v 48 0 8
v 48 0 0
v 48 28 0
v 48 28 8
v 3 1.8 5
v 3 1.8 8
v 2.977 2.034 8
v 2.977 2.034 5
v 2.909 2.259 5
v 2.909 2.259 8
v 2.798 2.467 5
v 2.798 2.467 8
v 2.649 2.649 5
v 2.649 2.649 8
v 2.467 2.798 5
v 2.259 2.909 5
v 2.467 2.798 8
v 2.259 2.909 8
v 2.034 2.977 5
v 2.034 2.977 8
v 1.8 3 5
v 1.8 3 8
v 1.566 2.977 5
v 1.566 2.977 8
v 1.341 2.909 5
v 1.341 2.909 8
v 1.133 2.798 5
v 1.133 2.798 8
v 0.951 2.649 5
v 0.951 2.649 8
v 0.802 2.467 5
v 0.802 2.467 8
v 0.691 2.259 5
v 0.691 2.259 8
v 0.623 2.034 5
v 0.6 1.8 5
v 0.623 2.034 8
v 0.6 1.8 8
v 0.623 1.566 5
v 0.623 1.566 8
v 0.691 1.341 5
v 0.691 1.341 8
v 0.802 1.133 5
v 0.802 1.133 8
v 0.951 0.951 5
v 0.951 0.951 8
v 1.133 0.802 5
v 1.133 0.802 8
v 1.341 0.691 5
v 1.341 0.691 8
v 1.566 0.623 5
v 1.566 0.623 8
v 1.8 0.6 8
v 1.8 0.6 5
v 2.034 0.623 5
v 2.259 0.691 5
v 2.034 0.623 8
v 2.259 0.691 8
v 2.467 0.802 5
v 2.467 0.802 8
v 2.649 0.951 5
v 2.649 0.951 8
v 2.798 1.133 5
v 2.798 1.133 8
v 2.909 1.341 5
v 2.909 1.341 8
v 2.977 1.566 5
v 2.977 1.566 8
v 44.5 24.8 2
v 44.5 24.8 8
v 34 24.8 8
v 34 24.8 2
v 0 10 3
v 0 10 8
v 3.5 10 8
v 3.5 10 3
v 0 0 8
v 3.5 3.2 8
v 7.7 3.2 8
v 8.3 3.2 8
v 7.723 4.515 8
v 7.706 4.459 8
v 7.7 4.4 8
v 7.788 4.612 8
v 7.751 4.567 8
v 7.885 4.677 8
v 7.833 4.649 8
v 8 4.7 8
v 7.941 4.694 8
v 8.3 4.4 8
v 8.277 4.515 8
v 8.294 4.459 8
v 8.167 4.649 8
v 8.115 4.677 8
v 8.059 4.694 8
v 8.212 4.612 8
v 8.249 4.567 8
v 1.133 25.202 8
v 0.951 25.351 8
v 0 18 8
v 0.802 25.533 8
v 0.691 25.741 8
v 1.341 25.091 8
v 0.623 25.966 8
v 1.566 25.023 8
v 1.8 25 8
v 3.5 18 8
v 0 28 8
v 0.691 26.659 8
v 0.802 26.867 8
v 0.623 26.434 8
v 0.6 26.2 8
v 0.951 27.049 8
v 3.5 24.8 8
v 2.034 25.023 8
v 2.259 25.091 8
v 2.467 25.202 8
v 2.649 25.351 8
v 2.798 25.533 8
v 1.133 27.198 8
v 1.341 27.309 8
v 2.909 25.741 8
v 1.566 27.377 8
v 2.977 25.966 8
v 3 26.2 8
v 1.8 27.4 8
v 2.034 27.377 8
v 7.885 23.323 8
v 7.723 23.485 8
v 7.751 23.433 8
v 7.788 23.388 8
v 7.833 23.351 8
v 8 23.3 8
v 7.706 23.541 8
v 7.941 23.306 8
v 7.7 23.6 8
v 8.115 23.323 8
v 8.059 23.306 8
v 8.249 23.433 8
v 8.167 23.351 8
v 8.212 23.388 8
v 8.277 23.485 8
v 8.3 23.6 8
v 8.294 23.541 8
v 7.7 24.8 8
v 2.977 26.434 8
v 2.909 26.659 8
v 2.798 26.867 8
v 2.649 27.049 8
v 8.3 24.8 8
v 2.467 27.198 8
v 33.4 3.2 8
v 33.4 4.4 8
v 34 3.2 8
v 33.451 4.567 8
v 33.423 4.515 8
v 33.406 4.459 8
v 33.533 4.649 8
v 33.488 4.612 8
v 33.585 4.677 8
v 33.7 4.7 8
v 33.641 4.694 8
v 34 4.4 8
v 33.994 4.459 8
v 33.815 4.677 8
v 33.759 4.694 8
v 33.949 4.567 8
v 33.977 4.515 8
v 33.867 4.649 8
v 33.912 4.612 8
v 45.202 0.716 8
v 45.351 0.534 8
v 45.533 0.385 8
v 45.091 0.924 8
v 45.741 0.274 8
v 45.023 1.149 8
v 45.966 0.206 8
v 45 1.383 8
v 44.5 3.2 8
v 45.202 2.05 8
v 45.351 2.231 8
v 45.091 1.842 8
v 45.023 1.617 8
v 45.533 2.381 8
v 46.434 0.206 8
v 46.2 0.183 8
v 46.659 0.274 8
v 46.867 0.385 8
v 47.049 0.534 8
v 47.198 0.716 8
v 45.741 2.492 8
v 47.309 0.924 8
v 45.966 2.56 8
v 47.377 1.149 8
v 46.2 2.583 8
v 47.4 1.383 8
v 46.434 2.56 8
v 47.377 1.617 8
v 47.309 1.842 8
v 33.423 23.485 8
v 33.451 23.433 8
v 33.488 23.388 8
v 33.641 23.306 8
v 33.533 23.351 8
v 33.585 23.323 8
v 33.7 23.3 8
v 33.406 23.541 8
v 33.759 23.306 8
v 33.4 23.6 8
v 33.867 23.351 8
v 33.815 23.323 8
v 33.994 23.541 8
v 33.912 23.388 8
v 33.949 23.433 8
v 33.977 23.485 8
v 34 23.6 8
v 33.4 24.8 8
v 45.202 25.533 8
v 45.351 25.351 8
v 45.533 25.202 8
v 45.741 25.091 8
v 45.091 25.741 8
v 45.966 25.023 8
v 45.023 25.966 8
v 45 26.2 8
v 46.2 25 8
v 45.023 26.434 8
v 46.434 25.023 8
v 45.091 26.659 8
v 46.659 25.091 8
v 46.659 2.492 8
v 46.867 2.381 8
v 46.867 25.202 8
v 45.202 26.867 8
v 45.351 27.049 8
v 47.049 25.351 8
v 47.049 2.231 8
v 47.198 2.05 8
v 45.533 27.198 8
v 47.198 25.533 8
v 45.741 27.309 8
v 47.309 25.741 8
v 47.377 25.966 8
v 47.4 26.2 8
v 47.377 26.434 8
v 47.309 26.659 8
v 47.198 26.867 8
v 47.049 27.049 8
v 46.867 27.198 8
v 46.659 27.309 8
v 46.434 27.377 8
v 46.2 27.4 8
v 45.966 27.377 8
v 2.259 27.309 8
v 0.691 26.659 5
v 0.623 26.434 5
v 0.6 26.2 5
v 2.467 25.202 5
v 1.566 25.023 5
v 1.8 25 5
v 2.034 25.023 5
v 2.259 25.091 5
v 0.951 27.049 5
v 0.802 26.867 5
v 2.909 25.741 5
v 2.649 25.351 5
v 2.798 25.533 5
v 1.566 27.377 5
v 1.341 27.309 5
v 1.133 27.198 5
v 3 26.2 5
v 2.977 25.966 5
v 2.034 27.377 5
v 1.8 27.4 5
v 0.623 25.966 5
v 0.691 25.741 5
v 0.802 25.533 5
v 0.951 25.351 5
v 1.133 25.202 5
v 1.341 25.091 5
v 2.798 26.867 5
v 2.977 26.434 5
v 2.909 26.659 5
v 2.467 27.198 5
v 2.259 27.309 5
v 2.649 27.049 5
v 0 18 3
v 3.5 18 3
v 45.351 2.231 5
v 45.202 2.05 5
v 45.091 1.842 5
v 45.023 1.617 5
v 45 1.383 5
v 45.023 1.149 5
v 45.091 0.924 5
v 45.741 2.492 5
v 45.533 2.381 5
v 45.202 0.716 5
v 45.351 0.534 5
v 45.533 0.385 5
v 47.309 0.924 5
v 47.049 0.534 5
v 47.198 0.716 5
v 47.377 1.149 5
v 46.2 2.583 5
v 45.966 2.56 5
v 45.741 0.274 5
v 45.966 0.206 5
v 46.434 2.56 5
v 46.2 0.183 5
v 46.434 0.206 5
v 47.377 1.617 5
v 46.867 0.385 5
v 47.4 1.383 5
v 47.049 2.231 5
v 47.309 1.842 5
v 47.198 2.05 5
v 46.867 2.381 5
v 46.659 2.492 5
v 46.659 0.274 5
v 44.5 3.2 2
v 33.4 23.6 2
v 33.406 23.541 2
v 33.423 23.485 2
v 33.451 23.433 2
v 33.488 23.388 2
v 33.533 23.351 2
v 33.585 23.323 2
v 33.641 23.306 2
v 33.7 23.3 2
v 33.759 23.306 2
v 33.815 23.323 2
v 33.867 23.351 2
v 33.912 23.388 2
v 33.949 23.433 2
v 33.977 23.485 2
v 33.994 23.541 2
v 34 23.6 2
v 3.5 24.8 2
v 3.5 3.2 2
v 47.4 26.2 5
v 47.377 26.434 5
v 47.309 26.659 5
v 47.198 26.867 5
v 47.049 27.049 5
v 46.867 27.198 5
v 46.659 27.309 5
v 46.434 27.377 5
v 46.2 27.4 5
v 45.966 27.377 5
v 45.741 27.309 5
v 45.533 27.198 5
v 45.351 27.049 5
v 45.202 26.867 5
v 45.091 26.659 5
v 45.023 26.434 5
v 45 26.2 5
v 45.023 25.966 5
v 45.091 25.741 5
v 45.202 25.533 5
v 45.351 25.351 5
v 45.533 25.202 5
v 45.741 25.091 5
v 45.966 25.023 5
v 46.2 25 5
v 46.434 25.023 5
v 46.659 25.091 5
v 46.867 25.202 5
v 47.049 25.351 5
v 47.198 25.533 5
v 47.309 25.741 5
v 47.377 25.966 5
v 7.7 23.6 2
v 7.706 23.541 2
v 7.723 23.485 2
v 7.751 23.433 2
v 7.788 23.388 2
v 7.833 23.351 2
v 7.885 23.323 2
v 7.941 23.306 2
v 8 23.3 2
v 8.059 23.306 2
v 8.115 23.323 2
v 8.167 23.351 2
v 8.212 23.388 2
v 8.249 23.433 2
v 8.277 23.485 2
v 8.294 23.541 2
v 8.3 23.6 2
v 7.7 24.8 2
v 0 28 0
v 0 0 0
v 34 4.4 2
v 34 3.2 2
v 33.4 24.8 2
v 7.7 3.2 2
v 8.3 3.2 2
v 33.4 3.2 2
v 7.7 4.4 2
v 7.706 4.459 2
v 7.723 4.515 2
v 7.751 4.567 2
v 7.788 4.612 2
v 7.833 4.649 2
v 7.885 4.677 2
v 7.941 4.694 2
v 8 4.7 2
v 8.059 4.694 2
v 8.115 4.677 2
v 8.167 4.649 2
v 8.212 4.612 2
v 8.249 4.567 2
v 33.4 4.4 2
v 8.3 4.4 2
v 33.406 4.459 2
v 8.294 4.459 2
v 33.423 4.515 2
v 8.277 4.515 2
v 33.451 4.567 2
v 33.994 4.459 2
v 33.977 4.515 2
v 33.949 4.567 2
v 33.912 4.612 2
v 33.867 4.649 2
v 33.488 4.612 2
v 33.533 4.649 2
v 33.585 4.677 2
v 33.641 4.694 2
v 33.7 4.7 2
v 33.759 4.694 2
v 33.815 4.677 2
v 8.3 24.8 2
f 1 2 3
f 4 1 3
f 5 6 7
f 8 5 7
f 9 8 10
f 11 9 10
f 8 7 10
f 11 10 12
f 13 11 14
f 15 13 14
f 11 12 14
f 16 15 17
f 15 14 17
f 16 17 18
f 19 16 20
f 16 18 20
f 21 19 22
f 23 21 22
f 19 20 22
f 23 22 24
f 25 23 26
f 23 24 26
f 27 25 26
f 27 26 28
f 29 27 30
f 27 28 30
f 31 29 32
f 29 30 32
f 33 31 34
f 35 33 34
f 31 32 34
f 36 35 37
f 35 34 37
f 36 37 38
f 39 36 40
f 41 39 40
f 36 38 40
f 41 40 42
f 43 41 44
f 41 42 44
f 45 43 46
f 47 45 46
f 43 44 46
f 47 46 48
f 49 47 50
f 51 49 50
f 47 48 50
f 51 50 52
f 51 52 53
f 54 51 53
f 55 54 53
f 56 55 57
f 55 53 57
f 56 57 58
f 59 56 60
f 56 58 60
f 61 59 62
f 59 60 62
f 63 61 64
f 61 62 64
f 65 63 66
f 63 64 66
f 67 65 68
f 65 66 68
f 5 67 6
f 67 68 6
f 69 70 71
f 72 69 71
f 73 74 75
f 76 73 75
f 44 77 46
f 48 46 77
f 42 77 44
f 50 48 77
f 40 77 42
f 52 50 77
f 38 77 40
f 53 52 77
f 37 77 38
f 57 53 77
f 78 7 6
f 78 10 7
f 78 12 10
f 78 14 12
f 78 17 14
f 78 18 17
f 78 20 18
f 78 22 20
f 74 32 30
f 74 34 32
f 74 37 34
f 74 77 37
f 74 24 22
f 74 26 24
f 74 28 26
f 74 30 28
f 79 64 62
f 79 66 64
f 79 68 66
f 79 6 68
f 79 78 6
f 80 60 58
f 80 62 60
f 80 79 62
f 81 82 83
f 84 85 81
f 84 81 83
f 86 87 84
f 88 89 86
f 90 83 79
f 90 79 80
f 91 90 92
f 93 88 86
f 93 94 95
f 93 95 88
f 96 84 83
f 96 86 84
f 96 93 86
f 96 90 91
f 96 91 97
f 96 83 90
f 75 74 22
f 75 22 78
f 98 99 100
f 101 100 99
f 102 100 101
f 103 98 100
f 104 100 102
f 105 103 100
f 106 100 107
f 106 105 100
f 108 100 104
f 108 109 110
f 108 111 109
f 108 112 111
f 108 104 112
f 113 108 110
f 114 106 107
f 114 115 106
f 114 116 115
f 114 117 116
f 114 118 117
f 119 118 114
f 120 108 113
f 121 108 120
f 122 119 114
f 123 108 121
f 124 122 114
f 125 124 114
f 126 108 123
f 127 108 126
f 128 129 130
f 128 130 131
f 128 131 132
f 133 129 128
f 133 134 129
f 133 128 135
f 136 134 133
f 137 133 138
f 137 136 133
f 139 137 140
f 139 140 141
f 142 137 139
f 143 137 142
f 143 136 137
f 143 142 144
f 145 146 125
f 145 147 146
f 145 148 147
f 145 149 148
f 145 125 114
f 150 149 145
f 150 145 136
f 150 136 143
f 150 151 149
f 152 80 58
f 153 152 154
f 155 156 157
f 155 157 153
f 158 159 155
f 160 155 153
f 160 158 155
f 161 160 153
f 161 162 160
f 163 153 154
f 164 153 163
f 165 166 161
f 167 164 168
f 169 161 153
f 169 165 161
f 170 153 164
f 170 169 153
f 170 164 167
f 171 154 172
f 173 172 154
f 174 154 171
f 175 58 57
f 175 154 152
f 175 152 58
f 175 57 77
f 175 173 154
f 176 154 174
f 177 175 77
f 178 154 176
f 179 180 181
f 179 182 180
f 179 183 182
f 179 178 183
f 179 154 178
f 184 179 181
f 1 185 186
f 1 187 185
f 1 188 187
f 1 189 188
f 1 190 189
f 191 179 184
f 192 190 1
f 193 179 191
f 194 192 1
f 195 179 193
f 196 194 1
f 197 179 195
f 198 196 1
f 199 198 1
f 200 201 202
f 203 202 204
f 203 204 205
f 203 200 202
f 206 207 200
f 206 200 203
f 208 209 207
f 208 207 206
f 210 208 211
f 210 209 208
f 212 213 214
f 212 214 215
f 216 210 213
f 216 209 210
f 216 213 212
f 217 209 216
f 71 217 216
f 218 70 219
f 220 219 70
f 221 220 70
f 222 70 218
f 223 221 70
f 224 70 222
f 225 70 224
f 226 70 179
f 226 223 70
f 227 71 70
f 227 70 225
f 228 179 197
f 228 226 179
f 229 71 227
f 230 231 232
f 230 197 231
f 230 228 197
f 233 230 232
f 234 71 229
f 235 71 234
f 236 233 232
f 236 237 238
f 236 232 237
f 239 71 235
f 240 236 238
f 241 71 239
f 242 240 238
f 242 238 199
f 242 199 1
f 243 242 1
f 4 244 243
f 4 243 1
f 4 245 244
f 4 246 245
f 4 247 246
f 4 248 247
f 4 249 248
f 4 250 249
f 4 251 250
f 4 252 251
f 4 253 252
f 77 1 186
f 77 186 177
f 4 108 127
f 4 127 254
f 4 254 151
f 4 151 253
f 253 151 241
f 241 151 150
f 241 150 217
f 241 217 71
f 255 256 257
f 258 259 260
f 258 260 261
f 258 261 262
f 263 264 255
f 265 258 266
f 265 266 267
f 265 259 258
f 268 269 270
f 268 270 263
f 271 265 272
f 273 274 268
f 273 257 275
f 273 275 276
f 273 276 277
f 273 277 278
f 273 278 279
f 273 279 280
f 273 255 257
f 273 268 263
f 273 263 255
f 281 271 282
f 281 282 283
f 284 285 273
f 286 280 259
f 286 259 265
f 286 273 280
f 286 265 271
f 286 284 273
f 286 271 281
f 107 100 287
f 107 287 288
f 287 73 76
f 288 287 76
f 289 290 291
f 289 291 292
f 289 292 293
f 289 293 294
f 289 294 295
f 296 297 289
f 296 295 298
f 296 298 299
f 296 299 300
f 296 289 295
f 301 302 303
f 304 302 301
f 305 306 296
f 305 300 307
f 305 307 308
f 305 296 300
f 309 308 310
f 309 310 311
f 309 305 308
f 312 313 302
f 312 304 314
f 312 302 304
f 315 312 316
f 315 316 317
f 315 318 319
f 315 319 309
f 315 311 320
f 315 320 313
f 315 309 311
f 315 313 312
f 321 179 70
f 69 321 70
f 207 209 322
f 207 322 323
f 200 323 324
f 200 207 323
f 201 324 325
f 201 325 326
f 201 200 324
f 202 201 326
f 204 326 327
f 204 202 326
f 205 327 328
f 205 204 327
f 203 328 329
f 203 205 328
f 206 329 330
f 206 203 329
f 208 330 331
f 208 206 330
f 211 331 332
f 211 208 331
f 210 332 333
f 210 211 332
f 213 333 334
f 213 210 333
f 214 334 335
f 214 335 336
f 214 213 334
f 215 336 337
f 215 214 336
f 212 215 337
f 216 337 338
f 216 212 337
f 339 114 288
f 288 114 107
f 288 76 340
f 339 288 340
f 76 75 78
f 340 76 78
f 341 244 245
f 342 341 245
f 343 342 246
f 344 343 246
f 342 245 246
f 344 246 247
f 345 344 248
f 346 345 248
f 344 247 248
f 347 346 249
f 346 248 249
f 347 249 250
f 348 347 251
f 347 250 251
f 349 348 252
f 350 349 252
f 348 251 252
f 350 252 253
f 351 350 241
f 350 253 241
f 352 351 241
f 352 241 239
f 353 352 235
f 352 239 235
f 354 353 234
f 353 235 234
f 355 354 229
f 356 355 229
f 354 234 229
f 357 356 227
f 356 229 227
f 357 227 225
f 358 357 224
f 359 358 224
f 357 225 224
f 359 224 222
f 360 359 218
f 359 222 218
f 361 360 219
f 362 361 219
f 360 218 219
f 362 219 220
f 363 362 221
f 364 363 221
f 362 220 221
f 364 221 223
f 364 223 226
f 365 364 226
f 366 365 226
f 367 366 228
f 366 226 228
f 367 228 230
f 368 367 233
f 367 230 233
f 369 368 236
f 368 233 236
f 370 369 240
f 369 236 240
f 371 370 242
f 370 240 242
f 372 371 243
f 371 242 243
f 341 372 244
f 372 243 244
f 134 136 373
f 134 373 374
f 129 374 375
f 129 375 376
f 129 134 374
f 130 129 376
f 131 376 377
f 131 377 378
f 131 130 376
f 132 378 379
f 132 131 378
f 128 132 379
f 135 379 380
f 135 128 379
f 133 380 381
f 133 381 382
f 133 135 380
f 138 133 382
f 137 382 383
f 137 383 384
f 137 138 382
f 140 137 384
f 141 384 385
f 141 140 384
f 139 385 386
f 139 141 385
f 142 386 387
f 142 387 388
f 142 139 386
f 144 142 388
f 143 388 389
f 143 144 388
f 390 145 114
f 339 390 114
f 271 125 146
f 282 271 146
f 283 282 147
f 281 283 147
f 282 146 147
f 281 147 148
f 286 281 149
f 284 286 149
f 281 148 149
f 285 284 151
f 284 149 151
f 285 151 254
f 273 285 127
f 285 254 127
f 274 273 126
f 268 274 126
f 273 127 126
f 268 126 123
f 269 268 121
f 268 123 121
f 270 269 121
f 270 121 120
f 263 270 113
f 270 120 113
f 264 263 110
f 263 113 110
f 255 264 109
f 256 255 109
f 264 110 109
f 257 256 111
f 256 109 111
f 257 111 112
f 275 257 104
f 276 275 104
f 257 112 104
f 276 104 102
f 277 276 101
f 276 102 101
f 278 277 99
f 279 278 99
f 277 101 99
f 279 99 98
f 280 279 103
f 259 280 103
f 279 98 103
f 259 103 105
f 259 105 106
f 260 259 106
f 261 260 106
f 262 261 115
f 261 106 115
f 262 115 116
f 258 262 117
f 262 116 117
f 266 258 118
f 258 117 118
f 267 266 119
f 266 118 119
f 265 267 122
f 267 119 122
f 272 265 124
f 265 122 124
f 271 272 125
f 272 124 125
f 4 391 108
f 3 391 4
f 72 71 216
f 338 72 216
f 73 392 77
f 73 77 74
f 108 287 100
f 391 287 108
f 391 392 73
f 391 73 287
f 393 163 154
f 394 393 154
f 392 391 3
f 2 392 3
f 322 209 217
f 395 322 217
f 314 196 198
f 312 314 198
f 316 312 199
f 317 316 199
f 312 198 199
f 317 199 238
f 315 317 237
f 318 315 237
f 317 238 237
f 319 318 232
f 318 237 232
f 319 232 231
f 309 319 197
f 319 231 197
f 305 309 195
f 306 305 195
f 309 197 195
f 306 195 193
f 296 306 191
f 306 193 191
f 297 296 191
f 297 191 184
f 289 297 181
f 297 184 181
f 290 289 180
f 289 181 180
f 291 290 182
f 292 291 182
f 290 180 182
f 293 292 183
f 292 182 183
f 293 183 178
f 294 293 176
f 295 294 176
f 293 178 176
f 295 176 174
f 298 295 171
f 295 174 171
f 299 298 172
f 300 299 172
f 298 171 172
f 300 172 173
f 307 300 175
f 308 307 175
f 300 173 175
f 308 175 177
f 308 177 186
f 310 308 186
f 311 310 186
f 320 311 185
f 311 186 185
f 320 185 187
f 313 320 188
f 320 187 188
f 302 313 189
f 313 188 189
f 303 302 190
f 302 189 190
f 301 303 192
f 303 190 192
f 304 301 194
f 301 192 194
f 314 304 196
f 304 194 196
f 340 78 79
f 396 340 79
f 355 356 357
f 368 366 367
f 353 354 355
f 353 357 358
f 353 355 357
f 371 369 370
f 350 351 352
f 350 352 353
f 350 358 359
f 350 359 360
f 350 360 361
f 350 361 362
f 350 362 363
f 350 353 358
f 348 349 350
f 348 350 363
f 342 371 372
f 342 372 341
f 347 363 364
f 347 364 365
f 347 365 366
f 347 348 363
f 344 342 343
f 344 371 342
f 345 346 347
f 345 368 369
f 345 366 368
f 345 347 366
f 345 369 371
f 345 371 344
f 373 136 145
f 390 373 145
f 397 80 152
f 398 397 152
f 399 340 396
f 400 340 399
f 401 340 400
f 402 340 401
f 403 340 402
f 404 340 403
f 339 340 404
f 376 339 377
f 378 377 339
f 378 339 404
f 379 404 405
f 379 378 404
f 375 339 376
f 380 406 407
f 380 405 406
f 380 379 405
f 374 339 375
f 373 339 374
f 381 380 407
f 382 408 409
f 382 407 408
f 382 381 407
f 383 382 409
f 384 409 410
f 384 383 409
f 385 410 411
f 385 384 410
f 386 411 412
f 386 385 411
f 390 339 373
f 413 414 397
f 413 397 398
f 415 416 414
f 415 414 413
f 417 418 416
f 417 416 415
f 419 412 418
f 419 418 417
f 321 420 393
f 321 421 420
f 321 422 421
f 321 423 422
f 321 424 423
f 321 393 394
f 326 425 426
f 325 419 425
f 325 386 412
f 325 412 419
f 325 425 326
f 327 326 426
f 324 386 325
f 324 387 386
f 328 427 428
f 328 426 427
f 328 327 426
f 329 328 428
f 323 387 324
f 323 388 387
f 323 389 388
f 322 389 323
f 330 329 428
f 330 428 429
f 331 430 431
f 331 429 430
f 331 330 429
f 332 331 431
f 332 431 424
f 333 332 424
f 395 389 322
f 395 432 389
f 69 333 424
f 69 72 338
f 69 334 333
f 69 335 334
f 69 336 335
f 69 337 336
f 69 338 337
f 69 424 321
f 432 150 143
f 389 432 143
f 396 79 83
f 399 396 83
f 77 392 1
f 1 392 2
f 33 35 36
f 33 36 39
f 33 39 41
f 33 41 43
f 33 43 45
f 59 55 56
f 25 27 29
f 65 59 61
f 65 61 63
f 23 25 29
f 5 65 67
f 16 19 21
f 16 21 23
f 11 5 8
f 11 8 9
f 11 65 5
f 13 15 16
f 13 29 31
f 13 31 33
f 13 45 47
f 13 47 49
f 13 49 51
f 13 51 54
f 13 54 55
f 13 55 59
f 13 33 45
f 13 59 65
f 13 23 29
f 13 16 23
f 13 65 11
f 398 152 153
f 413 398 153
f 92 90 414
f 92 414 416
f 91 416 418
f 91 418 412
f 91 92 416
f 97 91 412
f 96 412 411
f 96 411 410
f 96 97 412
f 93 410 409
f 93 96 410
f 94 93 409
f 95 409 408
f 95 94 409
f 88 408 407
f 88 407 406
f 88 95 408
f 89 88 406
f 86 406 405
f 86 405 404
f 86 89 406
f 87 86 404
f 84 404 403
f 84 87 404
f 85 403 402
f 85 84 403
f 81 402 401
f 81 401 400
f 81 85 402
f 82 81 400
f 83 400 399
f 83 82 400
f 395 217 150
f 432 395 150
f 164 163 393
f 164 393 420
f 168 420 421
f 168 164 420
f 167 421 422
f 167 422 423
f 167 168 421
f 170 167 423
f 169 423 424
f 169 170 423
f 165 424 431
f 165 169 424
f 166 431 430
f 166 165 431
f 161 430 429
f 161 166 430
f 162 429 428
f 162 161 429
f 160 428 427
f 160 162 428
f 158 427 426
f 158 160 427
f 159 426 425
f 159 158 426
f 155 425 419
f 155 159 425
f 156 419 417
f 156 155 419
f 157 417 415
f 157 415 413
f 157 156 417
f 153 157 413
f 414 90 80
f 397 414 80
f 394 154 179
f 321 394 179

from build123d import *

# Parameters (mm, degrees)
SKETCH_W        = 48
SKETCH_H        = 28
PAD_DEPTH       = 8
POCKET_DEPTH    = 6
SKETCH002_W     = 4
SKETCH002_H     = 8
POCKET001_DEPTH = 5
SKETCH004_R     = 1.2
POCKET002_DEPTH = 3


with BuildPart() as part:
    # Sketch → Pad (new body)
    with BuildSketch(Plane.XY):
        with Locations((24, 14)):
            Rectangle(SKETCH_W, SKETCH_H)
    extrude(amount=PAD_DEPTH)

    # Sketch001 → Pocket (cut)
    with BuildSketch(Plane.XY.offset(8)):
        with BuildLine():
            Line((3.5, 3.2), (7.7, 3.2))
            Line((7.7, 3.2), (7.7, 4.4))
            ThreePointArc((8.3, 4.4), (8, 4.7), (7.7, 4.4))
            Line((8.3, 4.4), (8.3, 3.2))
            Line((8.3, 3.2), (33.4, 3.2))
            Line((33.4, 3.2), (33.4, 4.4))
            ThreePointArc((34, 4.4), (33.7, 4.7), (33.4, 4.4))
            Line((34, 4.4), (34, 3.2))
            Line((34, 3.2), (44.5, 3.2))
            Line((44.5, 3.2), (44.5, 24.8))
            Line((44.5, 24.8), (34, 24.8))
            Line((34, 24.8), (34, 23.6))
            ThreePointArc((33.4, 23.6), (33.7, 23.3), (34, 23.6))
            Line((33.4, 23.6), (33.4, 24.8))
            Line((33.4, 24.8), (8.3, 24.8))
            Line((8.3, 24.8), (8.3, 23.6))
            ThreePointArc((7.7, 23.6), (8, 23.3), (8.3, 23.6))
            Line((7.7, 23.6), (7.7, 24.8))
            Line((7.7, 24.8), (3.5, 24.8))
            Line((3.5, 24.8), (3.5, 3.2))
        make_face()
    extrude(amount=-POCKET_DEPTH, mode=Mode.SUBTRACT)

    # Sketch002 → Pocket001 (cut)
    with BuildSketch(Plane.XY.offset(8)):
        with Locations((2, 14)):
            Rectangle(SKETCH002_W, SKETCH002_H)
    extrude(amount=-POCKET001_DEPTH, mode=Mode.SUBTRACT)

    # Sketch004 → Pocket002 (cut)
    with BuildSketch(Plane.XY.offset(8)):
        with Locations((1.8, 26.2)):
            Circle(SKETCH004_R)
        with Locations((1.8, 1.8)):
            Circle(SKETCH004_R)
        with Locations((46.2, 1.382931)):
            Circle(SKETCH004_R)
        with Locations((46.2, 26.2)):
            Circle(SKETCH004_R)
    extrude(amount=-POCKET002_DEPTH, mode=Mode.SUBTRACT)


solid = part.part
